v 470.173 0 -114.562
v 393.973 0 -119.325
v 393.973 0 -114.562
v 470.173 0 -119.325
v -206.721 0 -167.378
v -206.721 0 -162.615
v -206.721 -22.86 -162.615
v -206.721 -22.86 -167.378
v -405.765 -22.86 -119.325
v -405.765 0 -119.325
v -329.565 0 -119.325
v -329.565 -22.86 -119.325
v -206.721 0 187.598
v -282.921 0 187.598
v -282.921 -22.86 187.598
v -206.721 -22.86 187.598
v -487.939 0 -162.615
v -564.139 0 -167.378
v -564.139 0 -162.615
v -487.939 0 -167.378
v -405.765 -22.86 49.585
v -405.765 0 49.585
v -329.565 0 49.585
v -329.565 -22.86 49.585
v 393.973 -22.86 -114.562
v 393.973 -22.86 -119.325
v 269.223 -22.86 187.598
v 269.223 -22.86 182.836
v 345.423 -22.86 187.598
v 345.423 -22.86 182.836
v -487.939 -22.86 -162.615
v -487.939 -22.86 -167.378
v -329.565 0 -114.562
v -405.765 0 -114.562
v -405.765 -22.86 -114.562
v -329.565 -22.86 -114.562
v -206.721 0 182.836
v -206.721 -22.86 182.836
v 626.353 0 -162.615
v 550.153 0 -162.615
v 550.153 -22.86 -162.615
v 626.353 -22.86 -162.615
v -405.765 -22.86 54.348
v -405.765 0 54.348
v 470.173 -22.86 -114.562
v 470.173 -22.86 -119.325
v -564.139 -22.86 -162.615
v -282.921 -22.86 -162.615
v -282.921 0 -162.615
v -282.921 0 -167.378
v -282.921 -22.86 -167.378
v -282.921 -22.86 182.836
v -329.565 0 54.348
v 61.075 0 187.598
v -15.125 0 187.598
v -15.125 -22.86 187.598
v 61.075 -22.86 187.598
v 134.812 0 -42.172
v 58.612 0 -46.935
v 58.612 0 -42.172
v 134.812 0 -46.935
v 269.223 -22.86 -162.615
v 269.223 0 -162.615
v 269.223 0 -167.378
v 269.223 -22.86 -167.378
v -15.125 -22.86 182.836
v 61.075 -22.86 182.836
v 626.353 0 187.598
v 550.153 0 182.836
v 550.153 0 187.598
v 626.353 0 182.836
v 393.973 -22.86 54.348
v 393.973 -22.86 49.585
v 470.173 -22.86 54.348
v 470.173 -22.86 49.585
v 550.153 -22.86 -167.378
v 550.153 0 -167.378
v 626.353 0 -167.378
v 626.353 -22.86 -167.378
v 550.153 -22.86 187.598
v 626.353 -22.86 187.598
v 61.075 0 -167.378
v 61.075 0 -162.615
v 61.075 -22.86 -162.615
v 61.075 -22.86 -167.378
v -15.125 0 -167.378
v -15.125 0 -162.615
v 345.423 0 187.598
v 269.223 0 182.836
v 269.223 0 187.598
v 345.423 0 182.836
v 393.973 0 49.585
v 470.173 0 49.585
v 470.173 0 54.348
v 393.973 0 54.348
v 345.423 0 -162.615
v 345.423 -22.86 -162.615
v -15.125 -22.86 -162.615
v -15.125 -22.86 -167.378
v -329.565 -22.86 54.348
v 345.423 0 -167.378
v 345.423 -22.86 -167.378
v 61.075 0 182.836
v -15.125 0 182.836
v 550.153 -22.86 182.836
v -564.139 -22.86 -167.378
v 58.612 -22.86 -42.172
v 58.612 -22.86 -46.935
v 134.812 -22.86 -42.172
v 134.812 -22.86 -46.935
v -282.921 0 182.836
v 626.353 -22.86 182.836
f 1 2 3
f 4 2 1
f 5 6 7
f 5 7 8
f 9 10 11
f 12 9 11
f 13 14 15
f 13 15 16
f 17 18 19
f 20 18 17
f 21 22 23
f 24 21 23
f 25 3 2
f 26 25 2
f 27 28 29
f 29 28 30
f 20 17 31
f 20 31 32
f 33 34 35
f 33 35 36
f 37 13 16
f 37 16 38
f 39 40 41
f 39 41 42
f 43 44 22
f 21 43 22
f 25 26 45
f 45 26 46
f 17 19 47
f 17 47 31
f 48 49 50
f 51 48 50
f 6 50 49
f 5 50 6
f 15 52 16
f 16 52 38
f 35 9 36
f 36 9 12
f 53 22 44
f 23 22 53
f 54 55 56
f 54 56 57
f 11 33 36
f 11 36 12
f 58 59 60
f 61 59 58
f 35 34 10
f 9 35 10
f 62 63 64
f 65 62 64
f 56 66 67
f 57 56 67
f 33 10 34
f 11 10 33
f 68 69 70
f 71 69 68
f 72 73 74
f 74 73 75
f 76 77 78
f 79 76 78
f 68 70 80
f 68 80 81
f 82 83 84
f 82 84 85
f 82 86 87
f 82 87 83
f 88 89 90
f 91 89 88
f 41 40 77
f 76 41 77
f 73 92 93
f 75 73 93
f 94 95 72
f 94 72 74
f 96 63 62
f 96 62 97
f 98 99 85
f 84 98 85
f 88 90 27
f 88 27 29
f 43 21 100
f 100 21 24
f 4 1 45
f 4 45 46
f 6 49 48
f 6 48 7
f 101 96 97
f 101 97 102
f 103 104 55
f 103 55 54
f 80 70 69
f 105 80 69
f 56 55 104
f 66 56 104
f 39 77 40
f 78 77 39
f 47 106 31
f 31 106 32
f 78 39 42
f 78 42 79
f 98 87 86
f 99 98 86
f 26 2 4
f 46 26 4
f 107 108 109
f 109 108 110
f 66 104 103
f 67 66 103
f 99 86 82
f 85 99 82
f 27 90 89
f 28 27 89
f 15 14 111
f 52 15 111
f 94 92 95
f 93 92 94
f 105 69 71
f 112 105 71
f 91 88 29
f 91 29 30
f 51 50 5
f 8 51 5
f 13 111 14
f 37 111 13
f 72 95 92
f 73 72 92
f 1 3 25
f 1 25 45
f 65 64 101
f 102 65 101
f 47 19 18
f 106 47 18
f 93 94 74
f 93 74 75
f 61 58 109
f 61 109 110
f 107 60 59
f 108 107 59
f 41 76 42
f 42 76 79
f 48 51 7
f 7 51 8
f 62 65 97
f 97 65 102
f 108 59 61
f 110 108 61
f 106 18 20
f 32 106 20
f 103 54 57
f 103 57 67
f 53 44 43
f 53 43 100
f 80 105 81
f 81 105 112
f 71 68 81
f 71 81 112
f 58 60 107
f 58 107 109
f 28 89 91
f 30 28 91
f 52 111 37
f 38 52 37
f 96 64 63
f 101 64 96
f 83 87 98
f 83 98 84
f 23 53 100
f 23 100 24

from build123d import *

# Parameters (mm, degrees)
SKETCH1_W              = 76.2
SKETCH1_H              = 4.7625
BOSS_EXTRUDE1_DEPTH    = 22.86
BOSS_EXTRUDE1_2_DEPTH  = 22.86
BOSS_EXTRUDE1_3_DEPTH  = 22.86
BOSS_EXTRUDE1_4_DEPTH  = 22.86
BOSS_EXTRUDE1_5_DEPTH  = 22.86
BOSS_EXTRUDE1_6_DEPTH  = 22.86
BOSS_EXTRUDE1_7_DEPTH  = 22.86
BOSS_EXTRUDE1_8_DEPTH  = 22.86
BOSS_EXTRUDE1_9_DEPTH  = 22.86
BOSS_EXTRUDE1_10_DEPTH = 22.86
BOSS_EXTRUDE1_11_DEPTH = 22.86
BOSS_EXTRUDE1_12_DEPTH = 22.86
BOSS_EXTRUDE1_13_DEPTH = 22.86
BOSS_EXTRUDE1_14_DEPTH = 22.86


with BuildPart() as part:
    # Sketch1 → Boss-Extrude1 (new body)
    with BuildSketch(Plane(origin=(0, 0, 0), x_dir=(1, 0, 0), z_dir=(0, 1, 0))):
        with Locations((22.975489918, -185.216782031)):
            Rectangle(SKETCH1_W, SKETCH1_H)
    extrude(amount=-BOSS_EXTRUDE1_DEPTH)


with BuildPart() as body_2:
    # Sketch1 → Boss-Extrude1 2 (new body)
    with BuildSketch(Plane(origin=(0, 0, 0), x_dir=(1, 0, 0), z_dir=(0, 1, 0))):
        with Locations((-244.820624844, -185.216782031)):
            Rectangle(SKETCH1_W, SKETCH1_H)
    extrude(amount=-BOSS_EXTRUDE1_2_DEPTH)


with BuildPart() as body_3:
    # Sketch1 → Boss-Extrude1 3 (new body)
    with BuildSketch(Plane(origin=(0, 0, 0), x_dir=(1, 0, 0), z_dir=(0, 1, 0))):
        with Locations((-244.820624844, 164.99640518)):
            Rectangle(SKETCH1_W, SKETCH1_H)
    extrude(amount=-BOSS_EXTRUDE1_3_DEPTH)


with BuildPart() as body_4:
    # Sketch1 → Boss-Extrude1 4 (new body)
    with BuildSketch(Plane(origin=(0, 0, 0), x_dir=(1, 0, 0), z_dir=(0, 1, 0))):
        with Locations((-526.03932766, 164.99640518)):
            Rectangle(SKETCH1_W, SKETCH1_H)
    extrude(amount=-BOSS_EXTRUDE1_4_DEPTH)


with BuildPart() as body_5:
    # Sketch1 → Boss-Extrude1 5 (new body)
    with BuildSketch(Plane(origin=(0, 0, 0), x_dir=(1, 0, 0), z_dir=(0, 1, 0))):
        with Locations((307.322725536, 164.99640518)):
            Rectangle(SKETCH1_W, SKETCH1_H)
    extrude(amount=-BOSS_EXTRUDE1_5_DEPTH)


with BuildPart() as body_6:
    # Sketch1 → Boss-Extrude1 6 (new body)
    with BuildSketch(Plane(origin=(0, 0, 0), x_dir=(1, 0, 0), z_dir=(0, 1, 0))):
        with Locations((22.975489918, 164.99640518)):
            Rectangle(SKETCH1_W, SKETCH1_H)
    extrude(amount=-BOSS_EXTRUDE1_6_DEPTH)


with BuildPart() as body_7:
    # Sketch1 → Boss-Extrude1 7 (new body)
    with BuildSketch(Plane(origin=(0, 0, 0), x_dir=(1, 0, 0), z_dir=(0, 1, 0))):
        with Locations((588.253249623, 164.99640518)):
            Rectangle(SKETCH1_W, SKETCH1_H)
    extrude(amount=-BOSS_EXTRUDE1_7_DEPTH)


with BuildPart() as body_8:
    # Sketch1 → Boss-Extrude1 8 (new body)
    with BuildSketch(Plane(origin=(0, 0, 0), x_dir=(1, 0, 0), z_dir=(0, 1, 0))):
        with Locations((307.322725536, -185.216782031)):
            Rectangle(SKETCH1_W, SKETCH1_H)
    extrude(amount=-BOSS_EXTRUDE1_8_DEPTH)


with BuildPart() as body_9:
    # Sketch1 → Boss-Extrude1 9 (new body)
    with BuildSketch(Plane(origin=(0, 0, 0), x_dir=(1, 0, 0), z_dir=(0, 1, 0))):
        with Locations((588.253249623, -185.216782031)):
            Rectangle(SKETCH1_W, SKETCH1_H)
    extrude(amount=-BOSS_EXTRUDE1_9_DEPTH)


with BuildPart() as body_10:
    # Sketch1 → Boss-Extrude1 10 (new body)
    with BuildSketch(Plane(origin=(0, 0, 0), x_dir=(1, 0, 0), z_dir=(0, 1, 0))):
        with Locations((432.072930827, 116.94359482)):
            Rectangle(SKETCH1_W, SKETCH1_H)
    extrude(amount=-BOSS_EXTRUDE1_10_DEPTH)


with BuildPart() as body_11:
    # Sketch1 → Boss-Extrude1 11 (new body)
    with BuildSketch(Plane(origin=(0, 0, 0), x_dir=(1, 0, 0), z_dir=(0, 1, 0))):
        with Locations((432.072930827, -51.96640518)):
            Rectangle(SKETCH1_W, SKETCH1_H)
    extrude(amount=-BOSS_EXTRUDE1_11_DEPTH)


with BuildPart() as body_12:
    # Sketch1 → Boss-Extrude1 12 (new body)
    with BuildSketch(Plane(origin=(0, 0, 0), x_dir=(1, 0, 0), z_dir=(0, 1, 0))):
        with Locations((96.712063652, 44.55359482)):
            Rectangle(SKETCH1_W, SKETCH1_H)
    extrude(amount=-BOSS_EXTRUDE1_12_DEPTH)


with BuildPart() as body_13:
    # Sketch1 → Boss-Extrude1 13 (new body)
    with BuildSketch(Plane(origin=(0, 0, 0), x_dir=(1, 0, 0), z_dir=(0, 1, 0))):
        with Locations((-367.665071888, 116.94359482)):
            Rectangle(SKETCH1_W, SKETCH1_H)
    extrude(amount=-BOSS_EXTRUDE1_13_DEPTH)


with BuildPart() as body_14:
    # Sketch1 → Boss-Extrude1 14 (new body)
    with BuildSketch(Plane(origin=(0, 0, 0), x_dir=(1, 0, 0), z_dir=(0, 1, 0))):
        with Locations((-367.665071888, -51.96640518)):
            Rectangle(SKETCH1_W, SKETCH1_H)
    extrude(amount=-BOSS_EXTRUDE1_14_DEPTH)


solid = Compound([part.part, body_2.part, body_3.part, body_4.part, body_5.part, body_6.part, body_7.part, body_8.part, body_9.part, body_10.part, body_11.part, body_12.part, body_13.part, body_14.part])
